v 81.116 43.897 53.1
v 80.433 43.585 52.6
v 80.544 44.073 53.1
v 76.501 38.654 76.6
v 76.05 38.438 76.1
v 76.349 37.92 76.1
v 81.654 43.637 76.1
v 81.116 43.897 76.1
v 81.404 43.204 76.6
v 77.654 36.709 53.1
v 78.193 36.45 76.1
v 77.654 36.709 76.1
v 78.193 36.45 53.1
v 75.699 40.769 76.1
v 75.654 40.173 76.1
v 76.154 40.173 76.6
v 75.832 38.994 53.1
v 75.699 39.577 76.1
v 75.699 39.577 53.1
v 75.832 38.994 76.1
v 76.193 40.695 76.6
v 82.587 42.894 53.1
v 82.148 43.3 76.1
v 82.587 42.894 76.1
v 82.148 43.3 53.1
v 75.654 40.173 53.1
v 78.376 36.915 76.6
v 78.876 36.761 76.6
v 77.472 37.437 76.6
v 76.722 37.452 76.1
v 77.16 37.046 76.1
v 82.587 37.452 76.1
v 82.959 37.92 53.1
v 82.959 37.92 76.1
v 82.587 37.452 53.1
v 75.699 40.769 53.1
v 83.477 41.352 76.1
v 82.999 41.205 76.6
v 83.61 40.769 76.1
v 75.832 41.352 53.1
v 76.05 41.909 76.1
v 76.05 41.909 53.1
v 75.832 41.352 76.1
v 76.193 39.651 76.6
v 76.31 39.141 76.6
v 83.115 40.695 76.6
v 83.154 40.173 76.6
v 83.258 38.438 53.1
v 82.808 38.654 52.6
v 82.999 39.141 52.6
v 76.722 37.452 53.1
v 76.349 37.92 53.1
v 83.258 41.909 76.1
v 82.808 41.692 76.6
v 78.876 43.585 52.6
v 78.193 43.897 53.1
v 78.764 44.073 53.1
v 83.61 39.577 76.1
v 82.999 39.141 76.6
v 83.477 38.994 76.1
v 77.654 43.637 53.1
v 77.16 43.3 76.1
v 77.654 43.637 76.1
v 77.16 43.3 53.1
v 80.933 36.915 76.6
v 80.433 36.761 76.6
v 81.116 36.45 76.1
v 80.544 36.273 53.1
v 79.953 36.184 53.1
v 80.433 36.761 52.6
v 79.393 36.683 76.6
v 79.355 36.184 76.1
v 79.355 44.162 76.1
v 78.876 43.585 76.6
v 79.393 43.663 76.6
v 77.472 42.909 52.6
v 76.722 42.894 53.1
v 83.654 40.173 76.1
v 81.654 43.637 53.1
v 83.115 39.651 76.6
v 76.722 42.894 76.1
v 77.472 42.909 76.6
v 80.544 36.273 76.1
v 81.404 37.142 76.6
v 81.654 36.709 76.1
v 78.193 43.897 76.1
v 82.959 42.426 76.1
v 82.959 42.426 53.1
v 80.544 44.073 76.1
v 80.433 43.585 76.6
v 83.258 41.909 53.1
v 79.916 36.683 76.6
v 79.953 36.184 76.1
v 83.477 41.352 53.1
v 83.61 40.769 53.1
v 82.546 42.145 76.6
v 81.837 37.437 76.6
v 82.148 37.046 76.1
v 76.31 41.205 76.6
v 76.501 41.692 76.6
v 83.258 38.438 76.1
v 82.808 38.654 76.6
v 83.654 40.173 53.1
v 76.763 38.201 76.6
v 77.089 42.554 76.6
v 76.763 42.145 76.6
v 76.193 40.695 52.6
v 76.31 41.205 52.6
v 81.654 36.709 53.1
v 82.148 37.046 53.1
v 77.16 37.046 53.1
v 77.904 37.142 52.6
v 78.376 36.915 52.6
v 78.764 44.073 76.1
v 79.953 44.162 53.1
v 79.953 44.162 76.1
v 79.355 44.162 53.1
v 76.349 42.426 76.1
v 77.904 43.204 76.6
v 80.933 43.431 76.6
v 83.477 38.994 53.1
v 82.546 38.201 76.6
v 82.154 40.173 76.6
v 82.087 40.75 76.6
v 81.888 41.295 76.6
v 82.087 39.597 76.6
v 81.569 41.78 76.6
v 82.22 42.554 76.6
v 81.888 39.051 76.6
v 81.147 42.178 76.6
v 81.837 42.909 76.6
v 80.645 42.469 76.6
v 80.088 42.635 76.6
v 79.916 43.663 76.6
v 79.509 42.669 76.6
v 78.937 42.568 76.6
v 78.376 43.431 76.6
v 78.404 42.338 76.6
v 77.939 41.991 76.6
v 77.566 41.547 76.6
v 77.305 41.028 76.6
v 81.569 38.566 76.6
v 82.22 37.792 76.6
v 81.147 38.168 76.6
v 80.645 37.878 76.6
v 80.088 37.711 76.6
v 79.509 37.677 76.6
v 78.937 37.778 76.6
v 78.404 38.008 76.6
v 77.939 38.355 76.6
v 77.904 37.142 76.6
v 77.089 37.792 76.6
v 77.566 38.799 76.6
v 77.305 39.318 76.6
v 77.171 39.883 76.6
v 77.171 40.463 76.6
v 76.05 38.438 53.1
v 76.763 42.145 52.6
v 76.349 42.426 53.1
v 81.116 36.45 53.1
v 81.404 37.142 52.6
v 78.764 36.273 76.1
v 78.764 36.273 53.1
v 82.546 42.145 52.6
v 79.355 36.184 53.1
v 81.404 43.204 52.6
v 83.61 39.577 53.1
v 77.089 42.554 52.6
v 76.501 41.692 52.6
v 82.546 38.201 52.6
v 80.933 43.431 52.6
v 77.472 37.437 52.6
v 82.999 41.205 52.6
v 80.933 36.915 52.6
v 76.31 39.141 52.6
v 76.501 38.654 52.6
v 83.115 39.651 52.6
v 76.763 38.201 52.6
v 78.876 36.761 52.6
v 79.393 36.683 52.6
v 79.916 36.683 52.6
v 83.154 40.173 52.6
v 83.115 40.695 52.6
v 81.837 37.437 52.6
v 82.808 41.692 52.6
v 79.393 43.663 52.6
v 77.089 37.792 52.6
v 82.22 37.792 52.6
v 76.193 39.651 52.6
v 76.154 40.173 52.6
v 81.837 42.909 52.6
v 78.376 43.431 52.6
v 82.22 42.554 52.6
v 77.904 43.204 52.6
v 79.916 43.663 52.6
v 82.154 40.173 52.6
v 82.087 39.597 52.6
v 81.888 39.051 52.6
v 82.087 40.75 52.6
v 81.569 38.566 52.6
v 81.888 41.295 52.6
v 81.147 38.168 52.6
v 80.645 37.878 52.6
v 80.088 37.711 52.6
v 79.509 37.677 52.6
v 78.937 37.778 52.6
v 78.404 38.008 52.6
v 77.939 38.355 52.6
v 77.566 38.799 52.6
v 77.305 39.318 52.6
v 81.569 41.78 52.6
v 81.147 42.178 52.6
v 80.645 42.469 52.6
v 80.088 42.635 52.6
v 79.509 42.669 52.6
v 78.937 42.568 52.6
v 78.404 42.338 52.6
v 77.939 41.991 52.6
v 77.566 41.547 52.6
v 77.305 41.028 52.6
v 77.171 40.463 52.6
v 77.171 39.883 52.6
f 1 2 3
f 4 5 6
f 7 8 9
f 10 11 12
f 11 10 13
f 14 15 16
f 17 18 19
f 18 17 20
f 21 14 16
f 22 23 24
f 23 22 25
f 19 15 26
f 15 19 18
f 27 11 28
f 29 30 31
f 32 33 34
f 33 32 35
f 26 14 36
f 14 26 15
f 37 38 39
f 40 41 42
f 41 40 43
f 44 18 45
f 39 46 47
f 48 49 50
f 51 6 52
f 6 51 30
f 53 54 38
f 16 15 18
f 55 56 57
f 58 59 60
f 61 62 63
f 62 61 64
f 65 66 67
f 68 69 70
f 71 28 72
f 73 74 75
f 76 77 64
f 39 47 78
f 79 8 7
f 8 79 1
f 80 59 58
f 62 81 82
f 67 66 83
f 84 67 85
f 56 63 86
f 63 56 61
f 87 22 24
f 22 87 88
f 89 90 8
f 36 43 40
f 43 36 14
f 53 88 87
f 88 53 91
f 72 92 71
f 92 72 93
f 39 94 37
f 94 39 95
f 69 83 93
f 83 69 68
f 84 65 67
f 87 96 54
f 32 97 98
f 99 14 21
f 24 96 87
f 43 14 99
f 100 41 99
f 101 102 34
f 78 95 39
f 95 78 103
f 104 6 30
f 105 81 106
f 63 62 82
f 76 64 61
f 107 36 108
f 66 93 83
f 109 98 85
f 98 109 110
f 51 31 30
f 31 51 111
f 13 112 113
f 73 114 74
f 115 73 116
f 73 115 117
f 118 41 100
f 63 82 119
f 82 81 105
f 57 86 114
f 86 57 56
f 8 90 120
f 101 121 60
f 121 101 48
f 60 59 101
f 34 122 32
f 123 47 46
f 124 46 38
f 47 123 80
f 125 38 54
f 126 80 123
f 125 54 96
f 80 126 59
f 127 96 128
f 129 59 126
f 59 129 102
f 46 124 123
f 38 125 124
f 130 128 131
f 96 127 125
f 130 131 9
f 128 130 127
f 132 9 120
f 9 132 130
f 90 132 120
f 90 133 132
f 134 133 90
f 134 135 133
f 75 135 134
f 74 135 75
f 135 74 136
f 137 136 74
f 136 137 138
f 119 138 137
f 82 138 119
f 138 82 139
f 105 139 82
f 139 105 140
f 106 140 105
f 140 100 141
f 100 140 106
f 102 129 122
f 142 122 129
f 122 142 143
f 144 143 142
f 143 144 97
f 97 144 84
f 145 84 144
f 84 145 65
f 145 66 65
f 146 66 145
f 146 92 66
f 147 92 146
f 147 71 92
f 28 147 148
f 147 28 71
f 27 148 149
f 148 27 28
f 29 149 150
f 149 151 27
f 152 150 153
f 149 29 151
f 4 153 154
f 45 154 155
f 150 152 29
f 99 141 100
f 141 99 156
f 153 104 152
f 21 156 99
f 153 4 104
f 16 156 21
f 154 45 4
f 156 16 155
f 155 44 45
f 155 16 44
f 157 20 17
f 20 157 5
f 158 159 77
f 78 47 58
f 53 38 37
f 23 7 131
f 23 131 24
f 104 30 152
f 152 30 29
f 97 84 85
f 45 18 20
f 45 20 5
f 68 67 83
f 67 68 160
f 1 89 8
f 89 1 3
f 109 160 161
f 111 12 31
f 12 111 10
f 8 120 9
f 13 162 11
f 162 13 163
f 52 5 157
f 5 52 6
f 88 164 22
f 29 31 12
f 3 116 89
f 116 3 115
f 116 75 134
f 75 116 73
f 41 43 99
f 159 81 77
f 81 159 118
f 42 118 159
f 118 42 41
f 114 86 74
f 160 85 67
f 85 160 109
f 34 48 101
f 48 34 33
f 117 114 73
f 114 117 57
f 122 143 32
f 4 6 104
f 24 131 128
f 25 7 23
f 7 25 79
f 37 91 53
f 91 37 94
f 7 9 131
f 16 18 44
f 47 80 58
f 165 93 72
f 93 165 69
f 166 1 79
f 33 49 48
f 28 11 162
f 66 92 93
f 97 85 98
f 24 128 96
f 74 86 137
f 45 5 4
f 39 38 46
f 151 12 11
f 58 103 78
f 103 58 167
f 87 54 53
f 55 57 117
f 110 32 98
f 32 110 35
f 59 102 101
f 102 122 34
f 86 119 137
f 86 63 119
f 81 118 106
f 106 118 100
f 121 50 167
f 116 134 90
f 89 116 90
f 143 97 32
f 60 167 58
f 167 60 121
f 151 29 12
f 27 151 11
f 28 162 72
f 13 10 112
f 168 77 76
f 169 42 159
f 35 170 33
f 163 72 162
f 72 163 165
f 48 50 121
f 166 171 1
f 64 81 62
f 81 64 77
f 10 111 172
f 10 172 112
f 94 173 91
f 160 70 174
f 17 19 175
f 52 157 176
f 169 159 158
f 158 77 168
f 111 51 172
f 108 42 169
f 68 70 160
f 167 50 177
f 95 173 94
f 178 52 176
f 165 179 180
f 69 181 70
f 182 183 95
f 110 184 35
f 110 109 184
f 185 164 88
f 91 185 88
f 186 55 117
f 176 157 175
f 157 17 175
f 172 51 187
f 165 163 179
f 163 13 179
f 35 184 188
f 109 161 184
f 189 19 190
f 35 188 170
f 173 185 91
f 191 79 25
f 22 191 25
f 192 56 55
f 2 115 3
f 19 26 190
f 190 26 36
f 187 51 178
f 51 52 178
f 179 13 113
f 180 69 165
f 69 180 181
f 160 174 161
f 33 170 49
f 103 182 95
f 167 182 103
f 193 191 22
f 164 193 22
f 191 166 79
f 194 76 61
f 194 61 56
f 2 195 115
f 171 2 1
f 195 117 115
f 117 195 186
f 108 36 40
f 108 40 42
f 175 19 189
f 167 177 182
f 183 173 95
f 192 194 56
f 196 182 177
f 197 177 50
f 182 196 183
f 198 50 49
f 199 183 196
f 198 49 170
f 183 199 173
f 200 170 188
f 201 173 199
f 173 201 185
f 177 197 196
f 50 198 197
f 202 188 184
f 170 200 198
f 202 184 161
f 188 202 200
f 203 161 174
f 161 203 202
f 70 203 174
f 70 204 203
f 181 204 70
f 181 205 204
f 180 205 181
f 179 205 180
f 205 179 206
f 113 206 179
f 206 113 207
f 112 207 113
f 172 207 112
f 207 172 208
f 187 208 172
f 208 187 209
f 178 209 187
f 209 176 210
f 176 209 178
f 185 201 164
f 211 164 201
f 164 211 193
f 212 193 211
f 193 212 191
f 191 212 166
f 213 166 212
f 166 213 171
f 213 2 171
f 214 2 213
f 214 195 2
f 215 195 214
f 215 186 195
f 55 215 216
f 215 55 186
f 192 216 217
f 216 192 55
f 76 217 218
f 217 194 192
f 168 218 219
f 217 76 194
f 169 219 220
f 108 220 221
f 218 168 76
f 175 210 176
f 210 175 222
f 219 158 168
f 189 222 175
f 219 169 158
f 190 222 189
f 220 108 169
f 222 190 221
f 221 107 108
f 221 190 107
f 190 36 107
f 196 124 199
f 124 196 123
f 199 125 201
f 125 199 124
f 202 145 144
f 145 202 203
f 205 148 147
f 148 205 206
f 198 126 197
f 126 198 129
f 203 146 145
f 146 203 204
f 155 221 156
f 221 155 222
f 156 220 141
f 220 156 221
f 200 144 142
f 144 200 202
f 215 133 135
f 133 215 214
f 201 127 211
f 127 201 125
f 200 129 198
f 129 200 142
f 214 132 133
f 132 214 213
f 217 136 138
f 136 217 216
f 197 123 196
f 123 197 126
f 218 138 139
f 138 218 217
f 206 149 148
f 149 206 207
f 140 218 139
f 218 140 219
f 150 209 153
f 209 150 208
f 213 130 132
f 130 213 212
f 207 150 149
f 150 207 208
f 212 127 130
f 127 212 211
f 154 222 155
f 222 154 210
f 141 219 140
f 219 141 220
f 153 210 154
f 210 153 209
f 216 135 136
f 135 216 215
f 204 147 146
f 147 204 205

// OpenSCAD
// file: ../lib/common.scad
// ============================================================================
//  Вспомогательные модули общего назначения.
//  Подключать через use <lib/common.scad> — файл не содержит параметров
//  проекта и ни от чего не зависит.
// ============================================================================

_eps = 0.01;

// --------------------------------------------------------------------- 2D ---
// Прямоугольник со скруглёнными углами, по центру
module rrect(w, d, r) {
    rr = min(r, w/2 - _eps, d/2 - _eps);
    if (rr > 0) offset(r = rr) square([w - 2*rr, d - 2*rr], center = true);
    else square([w, d], center = true);
}

// --------------------------------------------------------------------- 3D ---
// Коробка со скруглением ТОЛЬКО вертикальных рёбер: нижние и верхние острые
module rounded_box(w, d, h, r) linear_extrude(height = h) rrect(w, d, r);

// Цилиндр с фасками на торцах (снимает «слоновью ногу» и облегчает посадку)
module chamfered_cyl(d, h, ch = 0.6, bottom = true, top = true) {
    r  = d/2;
    cb = bottom ? min(ch, h/2) : 0;
    ct = top    ? min(ch, h/2) : 0;
    if (cb <= 0 && ct <= 0) cylinder(d = d, h = h);
    else rotate_extrude(angle = 360) polygon(concat(
        [[0, 0]],
        cb > 0 ? [[r - cb, 0], [r, cb]] : [[r, 0]],
        ct > 0 ? [[r, h - ct], [r - ct, h]] : [[r, h]],
        [[0, h]]));
}

// Труба
module tube(od, id, h) difference() {
    cylinder(d = od, h = h);
    translate([0, 0, -_eps]) cylinder(d = id, h = h + 2*_eps);
}

// Сквозное отверстие, растянутое вверх-вниз для гарантированного вычитания
module thru(d, h) translate([0, 0, -_eps]) cylinder(d = d, h = h + 2*_eps);

// Потайное отверстие под саморез с конической головкой.
// Пластина занимает z = [0 .. t], головка утапливается сверху,
// саморез идёт вниз (в ответную стойку).
module countersunk_hole(free_d, head_d, t, down = 30) {
    cone_h = (head_d - free_d)/2;    // головка 90 градусов
    union() {
        translate([0, 0, -down]) cylinder(d = free_d, h = down + t - cone_h + _eps);
        translate([0, 0, t - cone_h]) cylinder(d1 = free_d, d2 = head_d, h = cone_h);
    }
}

// Паз (щелевое отверстие) длиной len по X, сквозной по высоте h
module slot(len, d, h) hull() for (s = [-1, 1])
    translate([s*(len - d)/2, 0, 0]) cylinder(d = d, h = h);

// Стойка под саморез: цилиндр с пилотным отверстием сверху.
// Снизу фаски нет — стойка растёт из дна детали.
module screw_boss(od, h, pilot_d, pilot_depth, ch = 0.6) difference() {
    chamfered_cyl(od, h, ch = ch, bottom = false, top = true);
    translate([0, 0, h - pilot_depth]) cylinder(d = pilot_d, h = pilot_depth + _eps);
}

// Треугольная косынка в плоскости XZ (катеты l по X и h по Z), толщина t по Y
module gusset(l, h, t) translate([0, -t/2, 0]) linear_extrude(height = t)
    polygon([[0, 0], [l, 0], [0, h]]);

// Конусное гнездо под заточенный винт-ось (ось Z вниз от z=0)
module cone_seat(d, depth) translate([0, 0, -depth])
    cylinder(d1 = 0.2, d2 = d, h = depth + _eps);

// Канавка под круглый пассик: тор, вычитаемый из обода
module belt_groove(pulley_d, groove_r) rotate_extrude(angle = 360)
    translate([pulley_d/2, 0]) circle(r = groove_r);

// Сетка облегчающих отверстий по кругу
module radial_holes(n, r, d, h) for (i = [0 : n - 1])
    rotate([0, 0, i*360/n]) translate([r, 0, 0]) thru(d, h);
// main file
// ============================================================================
//  ОСЬ ВЕРТИКАЛЬНОГО ПОДШИПНИКА ТОНАРМА (палец)
//
//  Сделана отдельной деталью не из любви к деталям, а ради печати:
//  так и палец, и вилка печатаются в идеальной ориентации без поддержек,
//  а рабочая поверхность пальца выходит круглой.
//  Запрессовывается в вилку, работает в канале стойки (со смазкой).
//  Полый — внутри проходит сигнальный провод.
//
//  Хороший апгрейд: заменить отрезком стальной трубки 8x1.5 мм.
//
//  Печать: стоя, 100% заполнение.
// ============================================================================

include <../params.scad>
use <../lib/common.scad>

module tonearm_pin() {
    translate([arm_pivot_pos[0], arm_pivot_pos[1],
               arm_pillar_top_z + arm_yoke_bar_t - arm_pin_len])
        difference() {
            chamfered_cyl(arm_pivot_shaft_d, arm_pin_len, ch = 0.5);
            thru(arm_pivot_wire_d, arm_pin_len);
        }
}

tonearm_pin();
